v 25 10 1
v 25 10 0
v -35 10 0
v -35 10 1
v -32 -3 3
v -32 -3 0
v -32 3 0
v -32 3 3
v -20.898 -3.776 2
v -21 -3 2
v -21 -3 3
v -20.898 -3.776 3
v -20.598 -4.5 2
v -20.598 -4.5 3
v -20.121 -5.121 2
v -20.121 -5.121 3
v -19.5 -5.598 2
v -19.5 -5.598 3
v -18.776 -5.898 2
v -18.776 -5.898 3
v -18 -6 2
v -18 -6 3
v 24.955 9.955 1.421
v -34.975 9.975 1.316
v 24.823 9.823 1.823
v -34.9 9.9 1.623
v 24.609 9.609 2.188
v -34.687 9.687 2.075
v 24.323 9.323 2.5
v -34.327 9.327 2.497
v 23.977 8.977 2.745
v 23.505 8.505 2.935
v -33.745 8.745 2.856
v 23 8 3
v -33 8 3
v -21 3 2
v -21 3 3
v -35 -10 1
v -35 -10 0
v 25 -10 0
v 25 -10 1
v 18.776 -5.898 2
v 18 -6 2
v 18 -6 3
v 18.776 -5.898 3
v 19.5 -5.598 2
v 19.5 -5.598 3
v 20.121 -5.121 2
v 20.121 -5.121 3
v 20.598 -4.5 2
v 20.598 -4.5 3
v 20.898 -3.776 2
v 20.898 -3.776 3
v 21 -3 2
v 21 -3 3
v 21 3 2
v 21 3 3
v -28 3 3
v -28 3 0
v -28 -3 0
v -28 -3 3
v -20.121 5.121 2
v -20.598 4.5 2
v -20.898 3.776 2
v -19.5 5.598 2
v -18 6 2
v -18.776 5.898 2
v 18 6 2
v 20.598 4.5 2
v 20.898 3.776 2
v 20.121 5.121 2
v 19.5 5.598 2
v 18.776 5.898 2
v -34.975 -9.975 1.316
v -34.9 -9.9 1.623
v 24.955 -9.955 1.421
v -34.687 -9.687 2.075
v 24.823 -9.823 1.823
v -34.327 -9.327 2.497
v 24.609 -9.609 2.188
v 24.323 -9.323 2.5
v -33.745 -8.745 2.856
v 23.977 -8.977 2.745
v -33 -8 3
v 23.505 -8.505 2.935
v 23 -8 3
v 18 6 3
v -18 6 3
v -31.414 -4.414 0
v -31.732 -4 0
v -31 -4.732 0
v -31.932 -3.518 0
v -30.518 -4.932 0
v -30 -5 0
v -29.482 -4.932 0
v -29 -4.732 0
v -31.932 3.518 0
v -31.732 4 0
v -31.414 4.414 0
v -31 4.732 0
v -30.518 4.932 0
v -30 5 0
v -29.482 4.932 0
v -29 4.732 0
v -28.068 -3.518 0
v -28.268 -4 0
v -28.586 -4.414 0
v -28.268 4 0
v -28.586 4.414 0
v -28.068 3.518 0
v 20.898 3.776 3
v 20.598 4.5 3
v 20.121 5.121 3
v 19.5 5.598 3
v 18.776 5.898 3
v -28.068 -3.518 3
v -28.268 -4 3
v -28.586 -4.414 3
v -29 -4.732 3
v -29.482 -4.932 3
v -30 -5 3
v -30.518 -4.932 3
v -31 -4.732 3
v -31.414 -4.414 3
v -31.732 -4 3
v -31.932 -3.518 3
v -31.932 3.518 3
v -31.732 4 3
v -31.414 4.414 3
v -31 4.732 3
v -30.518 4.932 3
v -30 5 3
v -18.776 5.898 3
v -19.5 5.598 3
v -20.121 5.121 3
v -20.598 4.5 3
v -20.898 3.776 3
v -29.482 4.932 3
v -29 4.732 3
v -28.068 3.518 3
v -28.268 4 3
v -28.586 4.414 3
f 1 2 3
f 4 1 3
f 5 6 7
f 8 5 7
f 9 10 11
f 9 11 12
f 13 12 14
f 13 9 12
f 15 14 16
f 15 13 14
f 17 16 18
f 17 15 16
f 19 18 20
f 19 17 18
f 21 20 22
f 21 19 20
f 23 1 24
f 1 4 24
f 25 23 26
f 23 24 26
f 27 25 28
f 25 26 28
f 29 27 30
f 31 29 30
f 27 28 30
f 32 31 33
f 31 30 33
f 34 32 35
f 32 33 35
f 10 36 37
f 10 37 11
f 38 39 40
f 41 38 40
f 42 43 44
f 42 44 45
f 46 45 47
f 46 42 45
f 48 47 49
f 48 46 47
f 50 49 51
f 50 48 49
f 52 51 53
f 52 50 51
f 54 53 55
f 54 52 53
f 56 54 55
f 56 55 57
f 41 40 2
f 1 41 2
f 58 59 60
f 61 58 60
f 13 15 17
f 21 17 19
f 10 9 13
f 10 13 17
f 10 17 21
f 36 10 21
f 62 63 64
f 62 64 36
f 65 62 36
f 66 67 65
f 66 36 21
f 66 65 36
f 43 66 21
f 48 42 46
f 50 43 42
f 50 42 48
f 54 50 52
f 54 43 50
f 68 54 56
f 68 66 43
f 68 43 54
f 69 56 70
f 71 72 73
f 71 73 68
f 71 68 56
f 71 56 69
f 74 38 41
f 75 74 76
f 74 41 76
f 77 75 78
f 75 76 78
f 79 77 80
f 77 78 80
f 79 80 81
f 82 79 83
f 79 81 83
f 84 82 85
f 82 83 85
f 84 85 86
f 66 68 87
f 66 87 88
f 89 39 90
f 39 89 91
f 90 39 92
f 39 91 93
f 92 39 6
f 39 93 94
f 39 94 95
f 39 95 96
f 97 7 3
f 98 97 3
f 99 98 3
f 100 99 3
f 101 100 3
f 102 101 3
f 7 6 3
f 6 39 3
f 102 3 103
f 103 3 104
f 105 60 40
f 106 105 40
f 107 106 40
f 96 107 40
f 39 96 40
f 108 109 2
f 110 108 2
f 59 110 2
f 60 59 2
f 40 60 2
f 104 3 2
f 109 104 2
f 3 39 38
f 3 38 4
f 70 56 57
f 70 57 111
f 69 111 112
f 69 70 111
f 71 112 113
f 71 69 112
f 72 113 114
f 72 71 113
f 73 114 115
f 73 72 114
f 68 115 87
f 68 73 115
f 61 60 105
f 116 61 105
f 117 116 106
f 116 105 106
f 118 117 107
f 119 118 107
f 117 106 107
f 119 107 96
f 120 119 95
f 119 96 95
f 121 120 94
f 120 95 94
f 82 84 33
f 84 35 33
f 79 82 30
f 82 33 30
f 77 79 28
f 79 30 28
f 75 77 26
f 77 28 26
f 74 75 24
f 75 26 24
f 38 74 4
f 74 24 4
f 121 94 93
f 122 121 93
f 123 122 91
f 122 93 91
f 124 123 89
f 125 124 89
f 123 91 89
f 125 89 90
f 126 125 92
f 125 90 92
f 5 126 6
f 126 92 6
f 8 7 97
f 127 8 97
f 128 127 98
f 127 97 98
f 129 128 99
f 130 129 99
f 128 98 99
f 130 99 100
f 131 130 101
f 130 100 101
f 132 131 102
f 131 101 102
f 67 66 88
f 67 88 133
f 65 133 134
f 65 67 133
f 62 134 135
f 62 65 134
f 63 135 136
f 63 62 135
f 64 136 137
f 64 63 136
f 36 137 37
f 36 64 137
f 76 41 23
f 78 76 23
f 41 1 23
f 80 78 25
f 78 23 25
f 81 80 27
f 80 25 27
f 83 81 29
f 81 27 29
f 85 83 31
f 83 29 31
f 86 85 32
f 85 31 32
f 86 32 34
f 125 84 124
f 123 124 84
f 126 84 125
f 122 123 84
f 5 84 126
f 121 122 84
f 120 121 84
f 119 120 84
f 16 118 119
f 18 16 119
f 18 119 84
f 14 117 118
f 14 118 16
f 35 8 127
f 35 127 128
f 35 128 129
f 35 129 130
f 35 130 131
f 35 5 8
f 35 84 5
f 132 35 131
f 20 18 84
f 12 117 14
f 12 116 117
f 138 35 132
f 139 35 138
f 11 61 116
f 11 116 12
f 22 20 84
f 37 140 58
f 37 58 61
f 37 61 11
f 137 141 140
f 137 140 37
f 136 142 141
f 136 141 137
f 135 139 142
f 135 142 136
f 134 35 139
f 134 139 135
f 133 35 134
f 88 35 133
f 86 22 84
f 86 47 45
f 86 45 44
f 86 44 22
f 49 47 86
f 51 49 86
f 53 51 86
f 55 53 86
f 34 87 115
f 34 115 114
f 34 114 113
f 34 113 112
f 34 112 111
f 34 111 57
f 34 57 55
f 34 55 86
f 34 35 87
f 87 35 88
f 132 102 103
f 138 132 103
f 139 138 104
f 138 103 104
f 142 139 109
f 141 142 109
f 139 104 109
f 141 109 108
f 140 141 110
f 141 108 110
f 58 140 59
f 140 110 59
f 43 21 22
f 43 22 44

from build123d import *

# Parameters (mm, degrees)
F0_W     = 50
F0_H     = 20
F0_W_2   = 10
F1_DEPTH = 3
F3_DEPTH = 3
F6_R     = 2


with BuildPart() as f1:
    # F0 (on Top) → F1 (new body)
    with BuildSketch(Plane.XY):
        Rectangle(F0_W, F0_H)
        with Locations((-30, 0)):
            Rectangle(F0_W_2, F0_H)
        with BuildLine():
            ThreePointArc((-30, 5), (-28.585786, 4.414214), (-28, 3))
            Line((-28, 3), (-28, -3))
            ThreePointArc((-28, -3), (-28.585786, -4.414214), (-30, -5))
            ThreePointArc((-30, -5), (-31.414214, -4.414214), (-32, -3))
            Line((-32, -3), (-32, 3))
            ThreePointArc((-32, 3), (-31.414214, 4.414214), (-30, 5))
        make_face(mode=Mode.SUBTRACT)
    extrude(amount=F1_DEPTH)


with BuildPart() as f3:
    # F2 (on Top) → F3 (new body)
    with BuildSketch(Plane.XY):
        with BuildLine():
            Line((-18, -6), (18, -6))
            ThreePointArc((18, -6), (20.12132, -5.12132), (21, -3))
            Line((21, -3), (21, 3))
            ThreePointArc((21, 3), (20.12132, 5.12132), (18, 6))
            Line((18, 6), (-18, 6))
            ThreePointArc((-18, 6), (-20.12132, 5.12132), (-21, 3))
            Line((-21, 3), (-21, -3))
            ThreePointArc((-21, -3), (-20.12132, -5.12132), (-18, -6))
        make_face()
    extrude(amount=F3_DEPTH)


with BuildPart() as f3_1:
    # F4: moved
    add(f3.part.moved(Location((0, 0, 2))))


with BuildPart() as f1_1:
    add(f1.part)

    # F5: cut F3
    add(f3_1.part, mode=Mode.SUBTRACT)

    # F6
    f6_edges = [f1_1.edges().sort_by_distance(p)[0] for p in [
        (-35, 0, 3),
        (25, 0, 3),
        (-5, 10, 3),
        (-5, -10, 3),
    ]]
    fillet(f6_edges, radius=F6_R)


solid = f1_1.part
